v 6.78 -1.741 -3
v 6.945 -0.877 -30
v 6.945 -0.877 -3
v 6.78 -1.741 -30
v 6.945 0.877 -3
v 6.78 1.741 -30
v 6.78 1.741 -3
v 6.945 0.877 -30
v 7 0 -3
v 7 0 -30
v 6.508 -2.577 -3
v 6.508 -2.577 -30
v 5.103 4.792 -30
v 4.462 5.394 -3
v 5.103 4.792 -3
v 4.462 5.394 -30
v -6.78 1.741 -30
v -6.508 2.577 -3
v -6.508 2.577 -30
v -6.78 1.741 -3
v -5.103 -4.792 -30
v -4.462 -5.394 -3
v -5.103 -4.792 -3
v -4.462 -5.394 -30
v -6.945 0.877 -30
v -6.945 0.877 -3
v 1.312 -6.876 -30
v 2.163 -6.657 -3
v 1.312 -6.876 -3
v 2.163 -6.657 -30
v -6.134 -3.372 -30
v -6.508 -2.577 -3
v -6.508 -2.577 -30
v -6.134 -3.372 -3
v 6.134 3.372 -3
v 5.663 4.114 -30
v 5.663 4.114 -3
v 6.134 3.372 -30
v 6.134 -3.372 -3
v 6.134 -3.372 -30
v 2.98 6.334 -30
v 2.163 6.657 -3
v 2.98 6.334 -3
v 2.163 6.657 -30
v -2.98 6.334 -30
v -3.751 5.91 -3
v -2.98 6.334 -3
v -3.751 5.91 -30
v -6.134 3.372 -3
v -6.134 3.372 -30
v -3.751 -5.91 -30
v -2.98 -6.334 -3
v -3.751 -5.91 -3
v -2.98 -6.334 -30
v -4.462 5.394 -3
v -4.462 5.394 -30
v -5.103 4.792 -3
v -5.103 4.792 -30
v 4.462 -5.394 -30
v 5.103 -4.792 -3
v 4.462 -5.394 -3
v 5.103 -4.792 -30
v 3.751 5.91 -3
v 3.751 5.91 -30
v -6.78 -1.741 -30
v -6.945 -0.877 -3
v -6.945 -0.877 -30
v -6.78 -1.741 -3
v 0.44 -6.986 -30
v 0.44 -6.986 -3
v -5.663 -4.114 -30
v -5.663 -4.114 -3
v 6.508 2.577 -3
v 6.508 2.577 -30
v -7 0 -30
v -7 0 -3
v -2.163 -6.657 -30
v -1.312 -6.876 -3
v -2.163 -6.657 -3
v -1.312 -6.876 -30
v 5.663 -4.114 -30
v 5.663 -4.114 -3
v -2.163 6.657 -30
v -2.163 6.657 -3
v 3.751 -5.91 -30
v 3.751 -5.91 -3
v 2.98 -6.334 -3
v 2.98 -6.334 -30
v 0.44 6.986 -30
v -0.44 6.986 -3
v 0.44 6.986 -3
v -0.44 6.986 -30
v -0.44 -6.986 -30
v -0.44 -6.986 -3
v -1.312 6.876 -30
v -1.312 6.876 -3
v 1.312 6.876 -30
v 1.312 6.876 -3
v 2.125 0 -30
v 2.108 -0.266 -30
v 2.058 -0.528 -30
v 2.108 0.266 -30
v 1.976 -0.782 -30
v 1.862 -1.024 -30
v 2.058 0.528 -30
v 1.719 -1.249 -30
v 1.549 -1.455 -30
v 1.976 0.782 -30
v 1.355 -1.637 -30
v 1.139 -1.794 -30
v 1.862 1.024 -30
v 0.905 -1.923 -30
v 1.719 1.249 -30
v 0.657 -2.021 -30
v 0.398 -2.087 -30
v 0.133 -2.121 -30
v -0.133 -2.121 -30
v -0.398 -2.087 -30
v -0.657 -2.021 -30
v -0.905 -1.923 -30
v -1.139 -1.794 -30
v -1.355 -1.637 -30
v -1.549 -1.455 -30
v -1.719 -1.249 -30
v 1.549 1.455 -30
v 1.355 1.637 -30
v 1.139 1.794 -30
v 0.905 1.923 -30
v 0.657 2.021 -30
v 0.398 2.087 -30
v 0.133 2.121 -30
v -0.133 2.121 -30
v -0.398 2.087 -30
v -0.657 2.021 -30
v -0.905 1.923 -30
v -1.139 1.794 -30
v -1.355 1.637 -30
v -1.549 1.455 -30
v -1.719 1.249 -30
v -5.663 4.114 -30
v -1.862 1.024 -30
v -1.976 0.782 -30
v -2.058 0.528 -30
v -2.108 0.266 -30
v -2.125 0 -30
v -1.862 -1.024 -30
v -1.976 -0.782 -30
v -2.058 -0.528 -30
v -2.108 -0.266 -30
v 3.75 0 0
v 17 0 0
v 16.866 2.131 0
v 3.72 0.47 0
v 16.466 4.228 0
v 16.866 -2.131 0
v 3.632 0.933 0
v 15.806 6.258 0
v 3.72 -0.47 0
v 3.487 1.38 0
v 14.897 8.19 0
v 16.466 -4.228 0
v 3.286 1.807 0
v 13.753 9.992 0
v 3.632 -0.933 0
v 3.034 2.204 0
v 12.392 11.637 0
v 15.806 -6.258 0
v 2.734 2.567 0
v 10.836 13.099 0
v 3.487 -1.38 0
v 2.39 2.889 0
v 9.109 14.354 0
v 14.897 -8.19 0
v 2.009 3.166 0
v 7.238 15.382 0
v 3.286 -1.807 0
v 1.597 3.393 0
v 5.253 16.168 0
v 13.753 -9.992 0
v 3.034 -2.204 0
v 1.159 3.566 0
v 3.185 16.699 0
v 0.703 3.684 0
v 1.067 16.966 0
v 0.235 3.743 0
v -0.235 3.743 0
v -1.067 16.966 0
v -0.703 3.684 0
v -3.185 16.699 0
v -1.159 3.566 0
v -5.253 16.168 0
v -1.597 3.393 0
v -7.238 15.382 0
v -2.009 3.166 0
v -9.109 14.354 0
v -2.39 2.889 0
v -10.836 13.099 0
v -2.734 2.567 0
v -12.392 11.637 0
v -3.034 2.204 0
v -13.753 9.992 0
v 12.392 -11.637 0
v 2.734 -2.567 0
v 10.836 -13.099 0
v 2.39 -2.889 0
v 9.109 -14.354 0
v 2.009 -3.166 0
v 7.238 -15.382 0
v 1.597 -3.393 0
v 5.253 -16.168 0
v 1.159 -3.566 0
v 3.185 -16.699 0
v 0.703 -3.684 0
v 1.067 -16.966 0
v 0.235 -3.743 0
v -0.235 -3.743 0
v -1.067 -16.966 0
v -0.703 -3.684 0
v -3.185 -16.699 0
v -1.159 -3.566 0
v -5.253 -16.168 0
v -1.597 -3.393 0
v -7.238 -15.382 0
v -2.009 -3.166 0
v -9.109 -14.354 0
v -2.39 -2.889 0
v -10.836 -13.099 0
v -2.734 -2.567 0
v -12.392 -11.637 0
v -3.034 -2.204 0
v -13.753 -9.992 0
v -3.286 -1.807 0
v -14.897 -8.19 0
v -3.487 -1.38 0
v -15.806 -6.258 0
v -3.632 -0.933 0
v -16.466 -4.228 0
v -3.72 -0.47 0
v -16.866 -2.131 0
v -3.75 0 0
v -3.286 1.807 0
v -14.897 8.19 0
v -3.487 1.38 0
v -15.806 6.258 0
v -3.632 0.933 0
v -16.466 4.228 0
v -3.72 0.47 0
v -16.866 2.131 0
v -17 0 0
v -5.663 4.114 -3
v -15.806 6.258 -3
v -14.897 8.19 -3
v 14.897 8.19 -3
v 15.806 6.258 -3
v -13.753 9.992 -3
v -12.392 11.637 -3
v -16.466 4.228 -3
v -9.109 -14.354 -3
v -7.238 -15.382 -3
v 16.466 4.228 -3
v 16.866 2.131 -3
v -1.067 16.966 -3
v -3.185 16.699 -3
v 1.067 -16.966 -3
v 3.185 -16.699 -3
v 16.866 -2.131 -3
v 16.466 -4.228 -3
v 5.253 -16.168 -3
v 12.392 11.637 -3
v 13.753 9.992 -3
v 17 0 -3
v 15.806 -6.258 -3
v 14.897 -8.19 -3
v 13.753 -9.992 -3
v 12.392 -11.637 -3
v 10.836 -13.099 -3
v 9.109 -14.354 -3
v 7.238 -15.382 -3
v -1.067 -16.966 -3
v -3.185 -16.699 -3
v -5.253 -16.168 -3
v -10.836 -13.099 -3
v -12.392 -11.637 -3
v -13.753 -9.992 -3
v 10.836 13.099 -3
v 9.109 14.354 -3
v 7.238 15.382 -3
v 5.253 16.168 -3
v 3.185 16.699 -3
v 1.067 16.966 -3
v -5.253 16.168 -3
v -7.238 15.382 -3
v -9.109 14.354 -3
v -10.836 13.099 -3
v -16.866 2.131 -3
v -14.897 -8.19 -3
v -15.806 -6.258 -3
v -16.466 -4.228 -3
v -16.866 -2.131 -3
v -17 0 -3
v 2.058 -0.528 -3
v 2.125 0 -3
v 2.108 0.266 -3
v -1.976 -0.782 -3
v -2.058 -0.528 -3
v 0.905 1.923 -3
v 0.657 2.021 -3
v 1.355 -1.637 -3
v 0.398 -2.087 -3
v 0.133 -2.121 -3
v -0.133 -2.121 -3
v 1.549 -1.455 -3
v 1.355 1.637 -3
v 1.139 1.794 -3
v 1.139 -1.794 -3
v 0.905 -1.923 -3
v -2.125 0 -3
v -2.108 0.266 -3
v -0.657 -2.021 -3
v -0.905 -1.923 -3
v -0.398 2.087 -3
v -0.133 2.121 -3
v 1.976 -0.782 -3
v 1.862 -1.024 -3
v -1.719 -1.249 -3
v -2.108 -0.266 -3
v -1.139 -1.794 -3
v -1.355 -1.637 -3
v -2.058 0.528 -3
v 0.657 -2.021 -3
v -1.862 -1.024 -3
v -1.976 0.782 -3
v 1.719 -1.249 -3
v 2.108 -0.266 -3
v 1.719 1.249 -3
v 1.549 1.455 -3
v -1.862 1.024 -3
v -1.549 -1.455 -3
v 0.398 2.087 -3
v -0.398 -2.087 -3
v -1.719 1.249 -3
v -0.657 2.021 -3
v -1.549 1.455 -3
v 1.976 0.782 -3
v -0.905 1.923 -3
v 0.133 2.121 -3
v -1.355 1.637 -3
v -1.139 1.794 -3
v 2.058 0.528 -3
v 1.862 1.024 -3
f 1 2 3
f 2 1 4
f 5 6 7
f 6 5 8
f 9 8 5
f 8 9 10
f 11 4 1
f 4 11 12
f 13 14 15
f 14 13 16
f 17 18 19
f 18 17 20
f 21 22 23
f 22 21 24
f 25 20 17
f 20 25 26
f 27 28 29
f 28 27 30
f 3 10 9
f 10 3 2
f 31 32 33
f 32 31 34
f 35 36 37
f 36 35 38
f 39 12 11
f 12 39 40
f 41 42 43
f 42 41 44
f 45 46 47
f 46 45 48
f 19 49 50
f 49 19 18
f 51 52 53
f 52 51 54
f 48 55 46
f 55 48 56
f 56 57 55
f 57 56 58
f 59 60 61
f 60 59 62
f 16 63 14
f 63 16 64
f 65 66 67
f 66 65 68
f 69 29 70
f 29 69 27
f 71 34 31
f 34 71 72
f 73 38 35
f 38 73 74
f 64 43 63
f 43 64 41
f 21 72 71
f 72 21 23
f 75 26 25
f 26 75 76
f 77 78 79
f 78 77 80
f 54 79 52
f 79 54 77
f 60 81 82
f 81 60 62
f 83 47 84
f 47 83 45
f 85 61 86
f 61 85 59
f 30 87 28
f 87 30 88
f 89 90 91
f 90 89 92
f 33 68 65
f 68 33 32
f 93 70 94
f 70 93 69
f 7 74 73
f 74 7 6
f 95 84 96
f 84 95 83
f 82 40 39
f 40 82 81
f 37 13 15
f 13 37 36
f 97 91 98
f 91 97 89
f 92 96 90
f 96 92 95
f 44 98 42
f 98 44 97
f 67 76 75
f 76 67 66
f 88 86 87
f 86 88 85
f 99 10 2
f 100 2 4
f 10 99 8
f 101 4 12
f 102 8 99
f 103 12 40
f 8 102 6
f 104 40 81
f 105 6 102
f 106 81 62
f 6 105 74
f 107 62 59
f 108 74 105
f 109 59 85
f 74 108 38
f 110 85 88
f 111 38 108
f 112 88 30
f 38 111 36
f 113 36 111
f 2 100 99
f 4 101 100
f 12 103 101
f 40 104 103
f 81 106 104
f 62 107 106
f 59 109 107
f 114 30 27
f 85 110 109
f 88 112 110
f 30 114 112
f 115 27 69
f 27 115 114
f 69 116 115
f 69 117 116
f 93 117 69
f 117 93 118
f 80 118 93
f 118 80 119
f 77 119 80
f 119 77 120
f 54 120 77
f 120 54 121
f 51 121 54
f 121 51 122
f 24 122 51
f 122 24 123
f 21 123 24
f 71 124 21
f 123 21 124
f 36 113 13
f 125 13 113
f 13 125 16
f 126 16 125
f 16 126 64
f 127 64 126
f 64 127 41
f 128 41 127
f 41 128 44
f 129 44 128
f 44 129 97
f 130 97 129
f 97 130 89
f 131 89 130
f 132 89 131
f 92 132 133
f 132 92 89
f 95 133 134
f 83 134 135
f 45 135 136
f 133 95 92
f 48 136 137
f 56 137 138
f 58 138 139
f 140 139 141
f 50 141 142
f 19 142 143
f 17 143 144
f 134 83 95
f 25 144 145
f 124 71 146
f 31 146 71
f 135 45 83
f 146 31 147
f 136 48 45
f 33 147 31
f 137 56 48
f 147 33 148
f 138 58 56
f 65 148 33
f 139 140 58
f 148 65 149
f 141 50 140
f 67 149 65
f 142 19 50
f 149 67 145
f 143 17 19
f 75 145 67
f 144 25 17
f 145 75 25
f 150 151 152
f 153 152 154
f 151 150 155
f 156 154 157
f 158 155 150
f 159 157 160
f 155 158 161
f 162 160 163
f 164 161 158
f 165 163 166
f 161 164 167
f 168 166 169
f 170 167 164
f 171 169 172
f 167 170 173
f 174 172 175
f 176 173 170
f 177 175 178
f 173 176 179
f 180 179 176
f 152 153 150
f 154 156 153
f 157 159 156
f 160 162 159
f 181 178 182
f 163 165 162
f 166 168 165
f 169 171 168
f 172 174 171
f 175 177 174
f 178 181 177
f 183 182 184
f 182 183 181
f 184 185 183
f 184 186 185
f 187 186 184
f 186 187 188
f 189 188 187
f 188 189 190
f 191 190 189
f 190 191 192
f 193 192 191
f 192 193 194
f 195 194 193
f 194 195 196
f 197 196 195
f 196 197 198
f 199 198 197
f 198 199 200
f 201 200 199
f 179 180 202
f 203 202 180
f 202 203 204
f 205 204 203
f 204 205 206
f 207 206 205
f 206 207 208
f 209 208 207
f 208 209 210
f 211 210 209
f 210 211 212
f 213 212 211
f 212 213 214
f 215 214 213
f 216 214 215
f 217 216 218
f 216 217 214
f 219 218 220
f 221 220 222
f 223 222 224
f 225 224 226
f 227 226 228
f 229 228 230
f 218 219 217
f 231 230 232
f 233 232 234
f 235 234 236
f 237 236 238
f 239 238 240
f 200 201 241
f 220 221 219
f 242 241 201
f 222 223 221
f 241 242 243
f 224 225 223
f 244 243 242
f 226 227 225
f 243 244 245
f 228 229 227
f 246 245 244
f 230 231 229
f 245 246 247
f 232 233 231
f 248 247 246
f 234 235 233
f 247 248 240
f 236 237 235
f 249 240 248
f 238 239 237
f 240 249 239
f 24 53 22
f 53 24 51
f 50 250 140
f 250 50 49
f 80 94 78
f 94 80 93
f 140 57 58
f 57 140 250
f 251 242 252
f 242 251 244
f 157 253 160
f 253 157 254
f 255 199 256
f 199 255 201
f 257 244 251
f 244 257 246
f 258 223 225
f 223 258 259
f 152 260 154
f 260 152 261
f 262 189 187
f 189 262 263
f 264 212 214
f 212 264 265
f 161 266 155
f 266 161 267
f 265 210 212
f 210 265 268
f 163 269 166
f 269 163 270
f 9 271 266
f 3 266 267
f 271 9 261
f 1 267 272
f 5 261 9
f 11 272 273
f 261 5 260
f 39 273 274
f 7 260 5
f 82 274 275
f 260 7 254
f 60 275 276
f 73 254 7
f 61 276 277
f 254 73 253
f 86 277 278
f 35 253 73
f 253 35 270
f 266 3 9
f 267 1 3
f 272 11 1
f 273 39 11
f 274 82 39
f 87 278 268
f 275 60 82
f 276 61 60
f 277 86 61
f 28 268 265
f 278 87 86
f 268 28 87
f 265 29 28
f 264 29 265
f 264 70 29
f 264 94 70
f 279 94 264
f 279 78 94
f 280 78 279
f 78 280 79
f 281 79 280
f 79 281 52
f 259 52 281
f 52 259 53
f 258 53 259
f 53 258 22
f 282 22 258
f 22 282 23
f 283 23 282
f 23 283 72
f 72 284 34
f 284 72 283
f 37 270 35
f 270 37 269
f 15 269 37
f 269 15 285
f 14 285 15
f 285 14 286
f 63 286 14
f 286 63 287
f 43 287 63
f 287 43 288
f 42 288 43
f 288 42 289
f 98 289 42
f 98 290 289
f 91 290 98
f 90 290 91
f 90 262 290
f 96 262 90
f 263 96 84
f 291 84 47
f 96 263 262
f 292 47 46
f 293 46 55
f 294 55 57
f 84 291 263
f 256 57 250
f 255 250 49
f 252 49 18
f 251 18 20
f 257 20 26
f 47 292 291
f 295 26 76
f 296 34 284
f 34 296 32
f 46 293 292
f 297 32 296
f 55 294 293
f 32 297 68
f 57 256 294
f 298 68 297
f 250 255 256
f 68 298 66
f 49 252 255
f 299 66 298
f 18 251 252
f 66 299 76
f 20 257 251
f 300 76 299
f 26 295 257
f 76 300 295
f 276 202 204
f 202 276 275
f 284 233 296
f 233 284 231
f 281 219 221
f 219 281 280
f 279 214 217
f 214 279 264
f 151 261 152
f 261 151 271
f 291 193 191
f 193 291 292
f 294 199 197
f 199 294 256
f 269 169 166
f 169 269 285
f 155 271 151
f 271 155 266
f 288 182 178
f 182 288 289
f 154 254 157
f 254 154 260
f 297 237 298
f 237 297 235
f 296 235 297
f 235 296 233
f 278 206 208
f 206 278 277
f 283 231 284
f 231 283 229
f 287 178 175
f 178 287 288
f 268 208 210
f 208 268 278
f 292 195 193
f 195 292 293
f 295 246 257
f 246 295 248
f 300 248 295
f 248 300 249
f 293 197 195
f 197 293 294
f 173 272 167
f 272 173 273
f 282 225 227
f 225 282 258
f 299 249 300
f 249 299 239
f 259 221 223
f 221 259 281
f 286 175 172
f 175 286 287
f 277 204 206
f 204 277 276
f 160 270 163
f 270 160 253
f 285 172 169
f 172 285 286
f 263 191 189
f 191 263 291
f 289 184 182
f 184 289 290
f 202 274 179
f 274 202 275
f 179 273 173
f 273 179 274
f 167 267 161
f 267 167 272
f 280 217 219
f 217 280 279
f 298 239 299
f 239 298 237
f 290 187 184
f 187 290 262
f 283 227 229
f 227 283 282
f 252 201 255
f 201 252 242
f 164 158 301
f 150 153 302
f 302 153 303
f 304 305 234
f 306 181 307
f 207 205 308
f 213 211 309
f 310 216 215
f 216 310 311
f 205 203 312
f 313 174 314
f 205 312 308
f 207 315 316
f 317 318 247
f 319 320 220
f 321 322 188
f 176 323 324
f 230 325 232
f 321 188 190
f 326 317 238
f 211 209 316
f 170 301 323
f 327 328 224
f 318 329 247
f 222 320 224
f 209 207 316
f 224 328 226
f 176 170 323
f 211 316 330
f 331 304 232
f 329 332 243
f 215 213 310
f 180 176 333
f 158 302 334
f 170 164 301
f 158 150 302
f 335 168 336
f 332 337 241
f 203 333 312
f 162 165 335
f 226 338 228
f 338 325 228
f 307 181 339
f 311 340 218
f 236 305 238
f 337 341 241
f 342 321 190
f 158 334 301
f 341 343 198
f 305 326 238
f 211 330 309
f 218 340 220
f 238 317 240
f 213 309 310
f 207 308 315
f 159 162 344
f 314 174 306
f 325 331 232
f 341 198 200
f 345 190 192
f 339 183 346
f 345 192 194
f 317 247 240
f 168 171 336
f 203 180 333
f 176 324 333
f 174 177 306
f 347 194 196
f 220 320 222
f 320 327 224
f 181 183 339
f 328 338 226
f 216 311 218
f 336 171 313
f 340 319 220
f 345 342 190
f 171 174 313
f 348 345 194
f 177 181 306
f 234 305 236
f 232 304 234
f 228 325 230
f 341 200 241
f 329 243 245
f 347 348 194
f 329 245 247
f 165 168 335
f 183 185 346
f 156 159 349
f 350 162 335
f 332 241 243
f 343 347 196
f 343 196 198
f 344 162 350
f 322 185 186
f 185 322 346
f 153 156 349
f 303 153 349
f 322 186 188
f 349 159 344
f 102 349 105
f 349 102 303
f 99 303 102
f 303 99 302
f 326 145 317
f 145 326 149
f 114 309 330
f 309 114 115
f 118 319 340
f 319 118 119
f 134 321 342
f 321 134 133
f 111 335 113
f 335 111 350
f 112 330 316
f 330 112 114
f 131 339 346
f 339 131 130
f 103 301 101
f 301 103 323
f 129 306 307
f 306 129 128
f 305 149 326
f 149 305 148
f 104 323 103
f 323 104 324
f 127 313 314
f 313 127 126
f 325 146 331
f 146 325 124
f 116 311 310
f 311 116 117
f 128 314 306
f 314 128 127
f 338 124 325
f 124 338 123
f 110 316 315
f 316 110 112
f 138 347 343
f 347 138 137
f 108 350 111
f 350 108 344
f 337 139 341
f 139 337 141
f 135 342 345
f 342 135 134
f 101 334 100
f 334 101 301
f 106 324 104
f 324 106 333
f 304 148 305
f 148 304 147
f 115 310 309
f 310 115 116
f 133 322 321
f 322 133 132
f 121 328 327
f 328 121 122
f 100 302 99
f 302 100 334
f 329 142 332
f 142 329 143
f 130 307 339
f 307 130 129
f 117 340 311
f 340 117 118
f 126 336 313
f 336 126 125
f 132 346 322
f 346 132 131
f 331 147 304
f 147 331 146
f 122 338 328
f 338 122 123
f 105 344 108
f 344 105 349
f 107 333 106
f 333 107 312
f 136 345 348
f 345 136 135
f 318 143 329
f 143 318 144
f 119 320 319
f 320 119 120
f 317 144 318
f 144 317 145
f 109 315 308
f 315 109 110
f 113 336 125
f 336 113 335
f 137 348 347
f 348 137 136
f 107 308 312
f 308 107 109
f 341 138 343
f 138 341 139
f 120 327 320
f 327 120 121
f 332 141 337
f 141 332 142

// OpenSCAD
$fn = 50;


difference() {
	union() {
		translate(v = [0, 0, -30.0000000000]) {
			cylinder(h = 30, r = 7.0000000000);
		}
		translate(v = [0, 0, -3.0000000000]) {
			cylinder(h = 3, r = 17.0000000000);
		}
	}
	union() {
		translate(v = [0, 0, 0]) {
			rotate(a = [0, 0, 0]) {
				difference() {
					union() {
						#translate(v = [0, 0, -30.0000000000]) {
							cylinder(h = 30, r = 2.0000000000);
						}
						#translate(v = [0, 0, -3]) {
							cylinder(h = 3, r = 7.0000000000, r1 = 2.1250000000, r2 = 3.7500000000);
						}
						#translate(v = [0, 0, -30.0000000000]) {
							cylinder(h = 30, r = 2.1250000000);
						}
						#translate(v = [0, 0, -30.0000000000]) {
							cylinder(h = 30, r = 2.0000000000);
						}
					}
					union();
				}
			}
		}
	}
}
